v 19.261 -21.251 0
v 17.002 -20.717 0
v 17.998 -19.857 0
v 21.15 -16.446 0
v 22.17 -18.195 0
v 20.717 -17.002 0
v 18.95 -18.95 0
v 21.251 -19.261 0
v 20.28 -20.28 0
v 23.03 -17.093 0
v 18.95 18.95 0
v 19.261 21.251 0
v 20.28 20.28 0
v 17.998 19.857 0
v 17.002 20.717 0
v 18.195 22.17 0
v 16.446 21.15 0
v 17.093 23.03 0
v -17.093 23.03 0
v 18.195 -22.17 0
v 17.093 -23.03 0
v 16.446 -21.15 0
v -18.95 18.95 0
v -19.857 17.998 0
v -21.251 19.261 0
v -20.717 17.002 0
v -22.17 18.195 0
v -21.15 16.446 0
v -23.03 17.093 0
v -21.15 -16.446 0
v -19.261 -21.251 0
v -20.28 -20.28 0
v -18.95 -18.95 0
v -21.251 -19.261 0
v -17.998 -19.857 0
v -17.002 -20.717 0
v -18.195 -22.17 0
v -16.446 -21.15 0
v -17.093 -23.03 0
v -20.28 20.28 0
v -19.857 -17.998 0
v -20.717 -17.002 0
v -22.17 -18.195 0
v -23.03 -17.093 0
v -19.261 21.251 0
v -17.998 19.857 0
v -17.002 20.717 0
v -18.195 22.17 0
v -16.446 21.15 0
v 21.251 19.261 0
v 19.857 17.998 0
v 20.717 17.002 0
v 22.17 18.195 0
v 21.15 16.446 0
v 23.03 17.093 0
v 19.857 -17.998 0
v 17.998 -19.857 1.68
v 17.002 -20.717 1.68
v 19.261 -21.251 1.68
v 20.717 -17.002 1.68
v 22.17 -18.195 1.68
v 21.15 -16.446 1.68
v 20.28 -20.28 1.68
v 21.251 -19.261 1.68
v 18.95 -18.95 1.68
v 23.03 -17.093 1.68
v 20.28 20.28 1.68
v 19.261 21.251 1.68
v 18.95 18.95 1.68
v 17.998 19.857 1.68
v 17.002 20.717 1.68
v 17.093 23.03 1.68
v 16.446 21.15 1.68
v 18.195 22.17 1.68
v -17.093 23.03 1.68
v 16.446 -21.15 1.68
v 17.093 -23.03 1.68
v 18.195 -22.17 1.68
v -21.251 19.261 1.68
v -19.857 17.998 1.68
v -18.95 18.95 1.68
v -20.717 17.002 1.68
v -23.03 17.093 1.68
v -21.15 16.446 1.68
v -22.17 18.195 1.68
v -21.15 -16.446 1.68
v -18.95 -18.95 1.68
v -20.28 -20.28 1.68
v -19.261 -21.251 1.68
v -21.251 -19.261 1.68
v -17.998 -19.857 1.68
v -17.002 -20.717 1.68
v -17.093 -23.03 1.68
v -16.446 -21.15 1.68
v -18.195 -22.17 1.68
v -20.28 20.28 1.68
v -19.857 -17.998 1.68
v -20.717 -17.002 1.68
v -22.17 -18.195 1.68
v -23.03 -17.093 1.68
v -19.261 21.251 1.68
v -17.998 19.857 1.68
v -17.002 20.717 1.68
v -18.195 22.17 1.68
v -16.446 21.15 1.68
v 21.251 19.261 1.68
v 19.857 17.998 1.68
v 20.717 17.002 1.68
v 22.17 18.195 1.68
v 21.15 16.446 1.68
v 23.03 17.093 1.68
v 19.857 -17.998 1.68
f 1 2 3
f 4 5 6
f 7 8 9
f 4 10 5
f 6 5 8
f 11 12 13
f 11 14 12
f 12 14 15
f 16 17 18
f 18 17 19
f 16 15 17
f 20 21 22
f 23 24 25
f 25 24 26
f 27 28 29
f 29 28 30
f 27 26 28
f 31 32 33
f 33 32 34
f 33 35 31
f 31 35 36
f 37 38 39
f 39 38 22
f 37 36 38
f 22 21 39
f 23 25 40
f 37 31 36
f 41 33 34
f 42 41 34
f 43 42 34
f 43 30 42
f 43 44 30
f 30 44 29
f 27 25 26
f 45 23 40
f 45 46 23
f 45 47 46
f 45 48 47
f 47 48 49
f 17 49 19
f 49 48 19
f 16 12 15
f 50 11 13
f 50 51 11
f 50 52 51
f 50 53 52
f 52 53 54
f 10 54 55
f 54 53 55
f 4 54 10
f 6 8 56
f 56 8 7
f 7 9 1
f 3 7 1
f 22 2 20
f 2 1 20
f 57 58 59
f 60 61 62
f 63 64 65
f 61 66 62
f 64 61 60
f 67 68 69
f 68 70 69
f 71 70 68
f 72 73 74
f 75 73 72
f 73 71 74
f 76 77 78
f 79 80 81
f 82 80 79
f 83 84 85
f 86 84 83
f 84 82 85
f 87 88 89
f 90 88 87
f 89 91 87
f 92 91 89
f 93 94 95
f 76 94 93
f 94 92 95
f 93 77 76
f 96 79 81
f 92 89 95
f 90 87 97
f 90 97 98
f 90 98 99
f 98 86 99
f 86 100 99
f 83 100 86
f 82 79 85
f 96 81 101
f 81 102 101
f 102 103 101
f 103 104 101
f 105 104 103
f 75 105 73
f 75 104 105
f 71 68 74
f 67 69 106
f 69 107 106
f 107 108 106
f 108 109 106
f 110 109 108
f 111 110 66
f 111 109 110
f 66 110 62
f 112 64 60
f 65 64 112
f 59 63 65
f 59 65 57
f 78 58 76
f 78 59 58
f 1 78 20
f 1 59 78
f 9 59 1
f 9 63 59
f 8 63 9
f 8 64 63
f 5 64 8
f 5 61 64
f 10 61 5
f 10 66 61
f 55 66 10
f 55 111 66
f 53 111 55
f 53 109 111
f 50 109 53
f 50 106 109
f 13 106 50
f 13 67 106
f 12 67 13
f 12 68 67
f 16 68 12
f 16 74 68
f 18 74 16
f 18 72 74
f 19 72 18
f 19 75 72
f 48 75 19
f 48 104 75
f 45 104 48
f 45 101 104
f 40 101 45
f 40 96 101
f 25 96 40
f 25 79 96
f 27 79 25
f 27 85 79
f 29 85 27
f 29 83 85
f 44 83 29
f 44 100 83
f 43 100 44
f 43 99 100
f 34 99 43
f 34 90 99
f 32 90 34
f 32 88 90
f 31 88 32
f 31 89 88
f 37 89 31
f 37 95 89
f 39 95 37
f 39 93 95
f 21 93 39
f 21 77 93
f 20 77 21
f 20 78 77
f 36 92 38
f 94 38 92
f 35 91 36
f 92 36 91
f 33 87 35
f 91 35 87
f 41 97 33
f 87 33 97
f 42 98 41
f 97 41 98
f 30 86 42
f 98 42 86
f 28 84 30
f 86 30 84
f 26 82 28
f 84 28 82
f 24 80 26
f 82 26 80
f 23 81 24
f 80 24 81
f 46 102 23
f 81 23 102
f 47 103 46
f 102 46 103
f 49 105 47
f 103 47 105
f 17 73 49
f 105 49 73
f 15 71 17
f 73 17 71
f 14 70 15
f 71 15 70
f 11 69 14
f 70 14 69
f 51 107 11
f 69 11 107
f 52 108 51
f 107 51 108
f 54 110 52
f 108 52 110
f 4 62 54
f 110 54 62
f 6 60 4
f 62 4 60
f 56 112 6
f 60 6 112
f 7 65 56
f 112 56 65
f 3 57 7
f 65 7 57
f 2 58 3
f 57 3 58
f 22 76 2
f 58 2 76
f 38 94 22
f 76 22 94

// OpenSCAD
// file: ../vitamins/stepper_motors.scad
/*
 * stepper_motors.scad - NEMA17 스테퍼 모터(stepper motor) 기성품(vitamin)
 *
 * Sanyo Denki SANMOTION F2 (SF2422/2423/2424) 시각화용 모델.
 * 제네릭 stepper_motor()는 프레임·보스·샤프트·마운팅 치수를 인자로 받아
 * 어떤 NEMA 규격(NEMA11·17·23 등)이든 만든다. NEMA 규격별 래퍼(nema17 등)가
 * 그 규격의 리터럴을 채우고, SF 모델 변형은 본체 길이만 넘긴다.
 * 실측은 docs/BOM.md를 따른다.
 *
 * Z 브레이크포인트(Z breakpoint) 최적화: 회전체(파일럿 보스 + 출력축)는
 * [r, z] 브레이크포인트 프로파일 한 개를 rotate_extrude로 한 번에 돌려
 * 단일 솔리드로 만든다. 사각 몸체는 Z 구간(rear bell / 적층 스택 / front
 * bell) 3개의 옥타곤(octagon) 압출로 쌓아 CSG 연산을 최소화한다.
 *
 * 좌표계: 마운팅 면(mounting face) = z=0, 몸체는 -z, 출력축은 +z로 돌출.
 */

include <../config.scad>

/*
 * 스테퍼 외형 2D(제네릭) — 정사각 프레임을 외접원(circumscribed circle)으로
 * 깎은 단면. 모서리는 직선 모따기가 아니라 대각 원호(corner arc)다 — 실제
 * NEMA 프레임 그대로. 시트(seat)·리세스(recess)·카운터보어(counterbore) 등
 * 모터를 받는 형상이 공유한다.
 *   w         프레임 한 변(frame width)
 *   corner_r  모서리 원호 반지름(corner arc radius) — 대각 치수/2
 */
module stepper_outline_2d(w, corner_r)
	intersection() {
		square([w, w], center = true);
		circle(r = corner_r, $fn = 128);	/* 코너 원호 매끈하게(전역 $fn 무시) */
	}

/*
 * 마운팅 홀 중심(제네릭) — 정사각 피치(square pitch) 패턴의 네 모서리 [x, y]
 * 좌표를 반환한다. 시트(seat)·리세스(recess)·체결 홀(fastening hole) 배치가
 * 같은 좌표 규칙을 공유한다.
 *   hole_pitch  마운팅 홀 피치(중심 간 거리)
 */
function stepper_hole_centers(hole_pitch) =
	[for (x = [-1, 1], y = [-1, 1]) [x * hole_pitch / 2, y * hole_pitch / 2]];

/* --- 색상(cosmetic) --- */
c_bell		= [0.78, 0.79, 0.81];	/* 알루미늄 엔드 벨 */
c_stack		= [0.24, 0.24, 0.27];	/* 적층 스택(steel) */
c_shaft		= [0.82, 0.82, 0.85];	/* 출력축·보스 */
c_bolt		= [0.15, 0.15, 0.16];	/* 타이로드 볼트 머리 */

/*
 * 스테퍼 모터(제네릭) — NEMA 규격 치수를 인자로 받아 어떤 프레임이든
 * 만든다. 빌드 헬퍼는 모두 중첩 모듈(nested module)로 두고, 만든 피처를
 * 그대로 배치한다(difference·union 없음).
 *   frame_w  프레임 한 변   corner_r    모서리 원호 반지름     bell_h 엔드 벨 높이
 *   boss_d/h 파일럿 보스    shaft_d/l   출력축 지름·길이      dcut_l D컷 길이
 *   hole_pitch/d 마운팅 홀  body_l      본체 길이
 */
module stepper_motor(frame_w, corner_r, bell_h, boss_d, boss_h,
		     shaft_d, shaft_l, dcut_l, hole_pitch, hole_d, body_l)
{
	/* 외형 비율(cosmetic) — NEMA 규격과 무관 */
	stack_inset	= 0.6;	/* 적층 스택(lamination stack) 인셋 */
	dcut_t		= 0.5;	/* D컷 평면 절삭량 */
	seg		= 24;	/* D 단면 분할 수 */

	/* 파생(derived) */
	r	= shaft_d / 2;			/* 축 반지름 */
	flat	= r - dcut_t;			/* D컷 평면까지 거리 */
	z_dcut	= boss_h + shaft_l - dcut_l;	/* round→D컷 경계 */
	tf	= acos(flat / r);		/* 평면 현(chord) 반각 */
	astep	= (360 - 2 * tf) / seg;

	/* Z 브레이크포인트 회전체 — [r, z] 윤곽선을 축으로 폐합해 단일 회전 */
	module revolve(points)
		rotate_extrude(convexity = 4)
			polygon(concat(points,
					[[0, points[len(points) - 1][1]],
					 [0, points[0][1]]]));

	/* 사각 몸체 — rear bell / 적층 스택 / front bell Z 구간 적층 */
	module body()
	{
		color(c_bell)
			translate([0, 0, -body_l])
				linear_extrude(bell_h + eps)	/* +eps: 적층 스택과 경계 겹침 */
					stepper_outline_2d(frame_w, corner_r);
		color(c_stack)
			translate([0, 0, -body_l + bell_h])
				linear_extrude(body_l - 2 * bell_h + eps)	/* +eps: front bell과 경계 겹침 */
					stepper_outline_2d(frame_w - 2 * stack_inset,
						corner_r);
		color(c_bell)
			translate([0, 0, -bell_h])
				linear_extrude(bell_h)
					stepper_outline_2d(frame_w, corner_r);
	}

	/* 파일럿 보스 + 출력축 — 단일 회전체 + D 단면 압출 */
	module shaft()
	{
		color(c_shaft)
			revolve([[boss_d / 2, 0], [boss_d / 2, boss_h],
				 [r, boss_h], [r, z_dcut]]);
		color(c_shaft)
			translate([0, 0, z_dcut])
				linear_extrude(dcut_l)
					polygon([for (i = [0 : seg])
						let (a = tf + i * astep)
							[r * cos(a), r * sin(a)]]);
	}

	/* 마운팅 홀 마커 + 뒤판 베어링 보스 + 타이로드 볼트 머리 */
	module detail()
	{
		color(c_bolt)
			for (c = stepper_hole_centers(hole_pitch))
				translate([c[0], c[1], -eps])		/* -eps: 마운팅 면(z=0)에 파묻음 */
					cylinder(h = 0.2 + eps, d = hole_d);
		color(c_shaft)
			translate([0, 0, -body_l - 1])
				cylinder(h = 1.5, d = 12);
		color(c_bolt)
			for (c = stepper_hole_centers(hole_pitch))
				translate([c[0], c[1], -body_l - 0.6])
					cylinder(h = 0.8, d = 4);
	}

	body();
	shaft();
	detail();
}

/* --- NEMA17 프레임 래퍼 — □42.3, 대각 53.6, 보스 ⌀22, 축 ⌀5, 마운팅 31 피치 --- */
module nema17(body_l)
	stepper_motor(42.3, 53.6 / 2, 8, 22, 2, 5, 24, 15, 31, 3.2, body_l);

/* NEMA17 외형 2D — 시트·리세스용(□42.3, 대각 53.6) */
module nema17_outline_2d()
	stepper_outline_2d(42.3, 53.6 / 2);

/* NEMA17 마운팅 홀 중심 — 시트·체결 홀 배치용(31 피치) */
function nema17_hole_centers() = stepper_hole_centers(31);

/* --- SF24 모델 변형 — 본체 길이만 다름(docs/BOM.md) --- */
module stepper_sf2422() { nema17(39); }		/* J4 WRIST */
module stepper_sf2423() { nema17(48); }		/* J3 ELBOW */
module stepper_sf2424() { nema17(59.5); }	/* J2 SHOULDER / J1 */

stepper_sf2424();
// file: ../config.scad
// SCARA 로봇 공통 사양(specification) — 모든 부품 파일에서 include해 사용한다.

$fn = 48;

// ── 공차(tolerance) ──
print_clearance = 0.2;   // FDM 출력 끼워맞춤(fit) 여유 — 압입(press-fit) 자리 제외
eps             = 1/128; // 미세 겹침(epsilon) — 접하는 솔리드를 살짝 겹쳐 동일면(coincident face) z-파이팅 방지

// ── FDM 출력 사양(print specification) ──
fdm_layer_h       = 0.28;   // 레이어 높이(layer height) — 슬라이서(slicer) 설정값과 일치시킨다.
fdm_shoulder_layers = 6;   // 숄더(shoulder) 최소 레이어 수 — FDM 최소 구조 벽(0.4mm 노즐 3겹 ~1.2mm) 기준 하한값.

// ── 레이아웃(layout) ──
// layout_margin — 플레이트 위 부품 배치 공통 여백(margin). 부품 외곽선에서
// 사방으로 주는 값 → 부품끼리는 2*margin 이격, 외곽 가장자리도 margin 확보.
layout_margin = 4;

// ── 시트 형상(seat geometry) ──
// seat_shoulder_t — fdm_layer_h · fdm_shoulder_layers 파생. 슬라이서 설정 변경 시 자동 연동.
seat_shoulder_t = fdm_layer_h * fdm_shoulder_layers;
// main file
include <../config.scad>
use <../vitamins/stepper_motors.scad>

linear_extrude(height = seat_shoulder_t)
    difference() {
        offset(delta = seat_shoulder_t + print_clearance) nema17_outline_2d();
        nema17_outline_2d();
    }
